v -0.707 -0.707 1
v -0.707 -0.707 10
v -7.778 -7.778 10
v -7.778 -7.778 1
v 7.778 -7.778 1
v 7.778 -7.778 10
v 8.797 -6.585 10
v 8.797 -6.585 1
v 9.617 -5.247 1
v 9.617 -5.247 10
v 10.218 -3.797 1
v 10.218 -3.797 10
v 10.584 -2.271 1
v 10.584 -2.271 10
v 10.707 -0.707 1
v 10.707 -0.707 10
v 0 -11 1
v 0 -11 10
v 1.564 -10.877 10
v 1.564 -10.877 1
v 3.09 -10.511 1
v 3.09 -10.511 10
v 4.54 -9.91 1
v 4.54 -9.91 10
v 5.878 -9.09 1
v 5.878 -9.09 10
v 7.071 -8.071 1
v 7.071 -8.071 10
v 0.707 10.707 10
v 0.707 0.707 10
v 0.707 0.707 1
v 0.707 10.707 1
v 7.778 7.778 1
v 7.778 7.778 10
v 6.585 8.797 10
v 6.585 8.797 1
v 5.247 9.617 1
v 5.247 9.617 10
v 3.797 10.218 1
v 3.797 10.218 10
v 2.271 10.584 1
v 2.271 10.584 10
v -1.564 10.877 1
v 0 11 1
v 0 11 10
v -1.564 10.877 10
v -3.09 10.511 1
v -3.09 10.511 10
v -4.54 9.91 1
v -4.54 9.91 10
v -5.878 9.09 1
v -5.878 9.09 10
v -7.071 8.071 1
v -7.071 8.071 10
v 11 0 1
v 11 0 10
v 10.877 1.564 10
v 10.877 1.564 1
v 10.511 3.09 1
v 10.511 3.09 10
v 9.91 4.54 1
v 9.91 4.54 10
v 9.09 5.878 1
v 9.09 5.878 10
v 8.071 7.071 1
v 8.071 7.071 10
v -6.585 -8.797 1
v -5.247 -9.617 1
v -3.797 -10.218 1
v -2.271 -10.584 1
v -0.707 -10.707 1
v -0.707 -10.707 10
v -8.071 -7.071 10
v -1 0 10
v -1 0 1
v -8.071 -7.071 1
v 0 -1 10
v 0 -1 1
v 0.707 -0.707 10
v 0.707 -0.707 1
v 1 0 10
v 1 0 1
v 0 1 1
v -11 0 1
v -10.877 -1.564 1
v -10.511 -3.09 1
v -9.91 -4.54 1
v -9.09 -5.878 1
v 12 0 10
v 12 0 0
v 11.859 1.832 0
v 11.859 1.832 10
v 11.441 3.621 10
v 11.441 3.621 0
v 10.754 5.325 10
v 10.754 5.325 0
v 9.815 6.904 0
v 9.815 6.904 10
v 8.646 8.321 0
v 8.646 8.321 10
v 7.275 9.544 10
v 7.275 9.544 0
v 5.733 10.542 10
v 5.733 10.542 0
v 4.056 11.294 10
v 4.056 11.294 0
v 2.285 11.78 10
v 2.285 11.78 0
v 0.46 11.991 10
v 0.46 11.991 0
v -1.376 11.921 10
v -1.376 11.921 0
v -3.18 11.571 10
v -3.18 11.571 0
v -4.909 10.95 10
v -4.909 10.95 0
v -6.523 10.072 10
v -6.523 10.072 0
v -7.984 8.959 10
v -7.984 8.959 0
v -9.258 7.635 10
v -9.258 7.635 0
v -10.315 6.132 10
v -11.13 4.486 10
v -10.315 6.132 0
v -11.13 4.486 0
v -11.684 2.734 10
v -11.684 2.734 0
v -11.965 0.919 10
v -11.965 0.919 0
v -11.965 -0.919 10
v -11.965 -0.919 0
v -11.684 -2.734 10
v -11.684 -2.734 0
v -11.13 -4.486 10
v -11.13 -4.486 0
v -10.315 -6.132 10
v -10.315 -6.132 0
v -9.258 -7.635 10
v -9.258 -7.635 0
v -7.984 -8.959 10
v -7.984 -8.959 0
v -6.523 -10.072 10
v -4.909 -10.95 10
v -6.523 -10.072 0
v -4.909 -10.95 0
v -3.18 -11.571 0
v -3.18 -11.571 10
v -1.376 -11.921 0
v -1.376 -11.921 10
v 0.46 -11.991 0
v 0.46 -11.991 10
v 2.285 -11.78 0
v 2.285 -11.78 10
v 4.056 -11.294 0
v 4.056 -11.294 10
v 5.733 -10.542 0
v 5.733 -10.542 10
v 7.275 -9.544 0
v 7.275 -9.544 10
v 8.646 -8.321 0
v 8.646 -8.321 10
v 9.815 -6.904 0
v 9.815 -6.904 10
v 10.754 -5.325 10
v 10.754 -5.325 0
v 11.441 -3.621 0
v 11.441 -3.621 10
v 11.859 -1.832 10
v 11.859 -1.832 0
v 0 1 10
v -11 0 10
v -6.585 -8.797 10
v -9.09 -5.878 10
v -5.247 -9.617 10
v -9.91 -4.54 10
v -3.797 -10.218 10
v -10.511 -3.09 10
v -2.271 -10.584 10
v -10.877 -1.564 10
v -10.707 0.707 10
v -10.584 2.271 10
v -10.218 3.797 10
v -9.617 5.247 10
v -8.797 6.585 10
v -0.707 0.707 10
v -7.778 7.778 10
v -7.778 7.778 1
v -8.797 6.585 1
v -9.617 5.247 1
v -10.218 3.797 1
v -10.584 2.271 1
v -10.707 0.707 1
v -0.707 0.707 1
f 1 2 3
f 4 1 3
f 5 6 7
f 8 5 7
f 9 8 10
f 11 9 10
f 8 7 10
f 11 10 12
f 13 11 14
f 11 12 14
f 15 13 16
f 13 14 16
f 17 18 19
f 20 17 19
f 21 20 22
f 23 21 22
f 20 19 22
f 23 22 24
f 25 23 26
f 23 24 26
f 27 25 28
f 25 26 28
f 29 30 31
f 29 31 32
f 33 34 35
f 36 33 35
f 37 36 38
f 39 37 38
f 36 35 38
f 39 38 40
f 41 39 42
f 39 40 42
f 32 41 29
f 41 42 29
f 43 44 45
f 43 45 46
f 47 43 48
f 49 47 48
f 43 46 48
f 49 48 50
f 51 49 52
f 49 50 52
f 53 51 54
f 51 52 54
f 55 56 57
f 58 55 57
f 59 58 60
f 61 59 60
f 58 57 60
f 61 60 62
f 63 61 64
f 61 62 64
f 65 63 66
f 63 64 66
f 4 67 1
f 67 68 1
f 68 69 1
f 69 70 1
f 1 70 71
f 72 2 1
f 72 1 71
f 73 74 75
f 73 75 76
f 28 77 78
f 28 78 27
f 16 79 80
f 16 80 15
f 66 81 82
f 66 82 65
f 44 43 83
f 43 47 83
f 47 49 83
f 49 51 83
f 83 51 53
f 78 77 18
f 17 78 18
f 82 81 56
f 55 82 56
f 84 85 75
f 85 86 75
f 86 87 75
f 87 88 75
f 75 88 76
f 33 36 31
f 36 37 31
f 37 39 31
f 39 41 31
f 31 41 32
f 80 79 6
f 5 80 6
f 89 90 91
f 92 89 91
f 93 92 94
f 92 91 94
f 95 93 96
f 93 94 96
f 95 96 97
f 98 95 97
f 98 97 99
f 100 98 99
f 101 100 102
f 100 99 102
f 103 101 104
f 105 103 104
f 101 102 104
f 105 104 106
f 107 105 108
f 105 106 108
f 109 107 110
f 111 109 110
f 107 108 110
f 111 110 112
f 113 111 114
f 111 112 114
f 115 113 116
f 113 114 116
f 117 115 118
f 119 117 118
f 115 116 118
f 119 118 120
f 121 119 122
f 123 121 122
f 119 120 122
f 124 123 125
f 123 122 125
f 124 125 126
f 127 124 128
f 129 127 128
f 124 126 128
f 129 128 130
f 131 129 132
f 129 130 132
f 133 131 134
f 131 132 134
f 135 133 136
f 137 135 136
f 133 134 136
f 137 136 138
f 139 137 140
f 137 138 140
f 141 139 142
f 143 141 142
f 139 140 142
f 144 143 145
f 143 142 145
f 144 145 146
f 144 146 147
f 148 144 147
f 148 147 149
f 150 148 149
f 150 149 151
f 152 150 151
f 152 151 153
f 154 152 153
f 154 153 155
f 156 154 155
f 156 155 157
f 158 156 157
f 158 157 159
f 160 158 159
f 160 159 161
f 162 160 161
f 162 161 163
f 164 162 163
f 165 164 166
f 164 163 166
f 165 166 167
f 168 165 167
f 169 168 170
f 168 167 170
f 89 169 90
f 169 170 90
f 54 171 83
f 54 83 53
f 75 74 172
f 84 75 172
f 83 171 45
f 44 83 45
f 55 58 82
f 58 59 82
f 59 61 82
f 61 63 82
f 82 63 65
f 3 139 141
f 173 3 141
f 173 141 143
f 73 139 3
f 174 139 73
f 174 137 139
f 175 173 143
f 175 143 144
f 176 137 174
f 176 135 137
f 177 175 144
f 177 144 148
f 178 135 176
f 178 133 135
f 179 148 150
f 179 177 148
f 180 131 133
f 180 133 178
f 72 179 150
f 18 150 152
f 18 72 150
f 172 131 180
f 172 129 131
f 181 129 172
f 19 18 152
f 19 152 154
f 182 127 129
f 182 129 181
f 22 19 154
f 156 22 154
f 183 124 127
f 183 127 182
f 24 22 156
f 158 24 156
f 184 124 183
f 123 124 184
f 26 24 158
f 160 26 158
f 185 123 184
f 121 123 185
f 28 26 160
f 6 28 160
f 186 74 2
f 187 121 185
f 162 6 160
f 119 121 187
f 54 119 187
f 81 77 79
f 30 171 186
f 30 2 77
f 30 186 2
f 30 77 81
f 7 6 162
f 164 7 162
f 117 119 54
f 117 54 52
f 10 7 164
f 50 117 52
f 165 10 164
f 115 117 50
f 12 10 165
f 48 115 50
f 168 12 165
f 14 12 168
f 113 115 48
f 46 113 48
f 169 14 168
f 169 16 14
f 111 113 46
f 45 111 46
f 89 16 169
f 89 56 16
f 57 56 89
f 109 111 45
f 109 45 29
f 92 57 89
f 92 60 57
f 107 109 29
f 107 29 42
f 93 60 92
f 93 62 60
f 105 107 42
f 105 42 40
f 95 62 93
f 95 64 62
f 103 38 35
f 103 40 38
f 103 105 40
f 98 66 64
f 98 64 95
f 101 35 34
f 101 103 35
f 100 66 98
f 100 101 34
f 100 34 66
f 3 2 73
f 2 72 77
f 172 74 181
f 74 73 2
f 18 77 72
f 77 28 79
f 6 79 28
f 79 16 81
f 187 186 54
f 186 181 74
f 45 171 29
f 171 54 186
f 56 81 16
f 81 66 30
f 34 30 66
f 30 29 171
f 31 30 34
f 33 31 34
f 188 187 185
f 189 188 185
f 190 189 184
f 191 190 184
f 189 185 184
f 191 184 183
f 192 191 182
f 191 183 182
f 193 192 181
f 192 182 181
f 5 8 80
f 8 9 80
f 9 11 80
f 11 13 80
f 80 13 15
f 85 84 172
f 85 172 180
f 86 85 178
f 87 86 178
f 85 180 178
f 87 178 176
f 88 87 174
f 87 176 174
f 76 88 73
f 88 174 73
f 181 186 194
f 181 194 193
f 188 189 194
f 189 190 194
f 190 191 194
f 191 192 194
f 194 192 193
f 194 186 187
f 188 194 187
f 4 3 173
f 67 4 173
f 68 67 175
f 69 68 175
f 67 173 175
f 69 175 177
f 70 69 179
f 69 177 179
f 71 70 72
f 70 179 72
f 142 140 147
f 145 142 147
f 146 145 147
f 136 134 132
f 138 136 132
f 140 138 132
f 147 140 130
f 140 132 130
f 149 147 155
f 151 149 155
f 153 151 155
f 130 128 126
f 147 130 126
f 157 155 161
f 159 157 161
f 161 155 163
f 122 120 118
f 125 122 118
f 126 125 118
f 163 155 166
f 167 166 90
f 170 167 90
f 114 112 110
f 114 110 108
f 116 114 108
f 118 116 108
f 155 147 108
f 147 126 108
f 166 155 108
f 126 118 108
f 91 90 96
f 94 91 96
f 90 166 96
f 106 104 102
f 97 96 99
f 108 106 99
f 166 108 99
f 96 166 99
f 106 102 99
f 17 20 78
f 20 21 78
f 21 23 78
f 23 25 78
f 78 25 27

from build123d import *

# Parameters (mm, degrees)
CYLINDER001_W     = 10
CYLINDER001_H     = 10
CYLINDER001_ANGLE = 45
ARRAY_COUNT       = 8
CYLINDER_R        = 12
CYLINDER_DEPTH    = 10


with BuildPart() as array:
    # Cylinder001 → Cylinder001 (revolve)
    with BuildSketch(Plane(origin=(1, 0, 0), x_dir=(1, 0, 0), z_dir=(0, -1, 0))):
        with Locations((5, 5)):
            Rectangle(CYLINDER001_W, CYLINDER001_H)
    revolve(axis=Axis((1, 0, 0), (0, 0, 1)), revolution_arc=CYLINDER001_ANGLE)

    # Array: Array ×8 about axis
    array_axis = Axis((0, 0, 0), (0, 0, 1))


with BuildPart() as array_1:
    add(array.part)
    for i in range(1, ARRAY_COUNT):
        add(array.part.rotate(array_axis, i * 360 / ARRAY_COUNT))


with BuildPart() as array_2:
    # Array placement: moved
    add(array_1.part.moved(Location((0, 0, 1))))


with BuildPart() as cut:
    # Cylinder → Cylinder (new body)
    with BuildSketch(Plane.XY):
        Circle(CYLINDER_R)
    extrude(amount=CYLINDER_DEPTH)

    # Cut: cut Array
    add(array_2.part, mode=Mode.SUBTRACT)


solid = cut.part
